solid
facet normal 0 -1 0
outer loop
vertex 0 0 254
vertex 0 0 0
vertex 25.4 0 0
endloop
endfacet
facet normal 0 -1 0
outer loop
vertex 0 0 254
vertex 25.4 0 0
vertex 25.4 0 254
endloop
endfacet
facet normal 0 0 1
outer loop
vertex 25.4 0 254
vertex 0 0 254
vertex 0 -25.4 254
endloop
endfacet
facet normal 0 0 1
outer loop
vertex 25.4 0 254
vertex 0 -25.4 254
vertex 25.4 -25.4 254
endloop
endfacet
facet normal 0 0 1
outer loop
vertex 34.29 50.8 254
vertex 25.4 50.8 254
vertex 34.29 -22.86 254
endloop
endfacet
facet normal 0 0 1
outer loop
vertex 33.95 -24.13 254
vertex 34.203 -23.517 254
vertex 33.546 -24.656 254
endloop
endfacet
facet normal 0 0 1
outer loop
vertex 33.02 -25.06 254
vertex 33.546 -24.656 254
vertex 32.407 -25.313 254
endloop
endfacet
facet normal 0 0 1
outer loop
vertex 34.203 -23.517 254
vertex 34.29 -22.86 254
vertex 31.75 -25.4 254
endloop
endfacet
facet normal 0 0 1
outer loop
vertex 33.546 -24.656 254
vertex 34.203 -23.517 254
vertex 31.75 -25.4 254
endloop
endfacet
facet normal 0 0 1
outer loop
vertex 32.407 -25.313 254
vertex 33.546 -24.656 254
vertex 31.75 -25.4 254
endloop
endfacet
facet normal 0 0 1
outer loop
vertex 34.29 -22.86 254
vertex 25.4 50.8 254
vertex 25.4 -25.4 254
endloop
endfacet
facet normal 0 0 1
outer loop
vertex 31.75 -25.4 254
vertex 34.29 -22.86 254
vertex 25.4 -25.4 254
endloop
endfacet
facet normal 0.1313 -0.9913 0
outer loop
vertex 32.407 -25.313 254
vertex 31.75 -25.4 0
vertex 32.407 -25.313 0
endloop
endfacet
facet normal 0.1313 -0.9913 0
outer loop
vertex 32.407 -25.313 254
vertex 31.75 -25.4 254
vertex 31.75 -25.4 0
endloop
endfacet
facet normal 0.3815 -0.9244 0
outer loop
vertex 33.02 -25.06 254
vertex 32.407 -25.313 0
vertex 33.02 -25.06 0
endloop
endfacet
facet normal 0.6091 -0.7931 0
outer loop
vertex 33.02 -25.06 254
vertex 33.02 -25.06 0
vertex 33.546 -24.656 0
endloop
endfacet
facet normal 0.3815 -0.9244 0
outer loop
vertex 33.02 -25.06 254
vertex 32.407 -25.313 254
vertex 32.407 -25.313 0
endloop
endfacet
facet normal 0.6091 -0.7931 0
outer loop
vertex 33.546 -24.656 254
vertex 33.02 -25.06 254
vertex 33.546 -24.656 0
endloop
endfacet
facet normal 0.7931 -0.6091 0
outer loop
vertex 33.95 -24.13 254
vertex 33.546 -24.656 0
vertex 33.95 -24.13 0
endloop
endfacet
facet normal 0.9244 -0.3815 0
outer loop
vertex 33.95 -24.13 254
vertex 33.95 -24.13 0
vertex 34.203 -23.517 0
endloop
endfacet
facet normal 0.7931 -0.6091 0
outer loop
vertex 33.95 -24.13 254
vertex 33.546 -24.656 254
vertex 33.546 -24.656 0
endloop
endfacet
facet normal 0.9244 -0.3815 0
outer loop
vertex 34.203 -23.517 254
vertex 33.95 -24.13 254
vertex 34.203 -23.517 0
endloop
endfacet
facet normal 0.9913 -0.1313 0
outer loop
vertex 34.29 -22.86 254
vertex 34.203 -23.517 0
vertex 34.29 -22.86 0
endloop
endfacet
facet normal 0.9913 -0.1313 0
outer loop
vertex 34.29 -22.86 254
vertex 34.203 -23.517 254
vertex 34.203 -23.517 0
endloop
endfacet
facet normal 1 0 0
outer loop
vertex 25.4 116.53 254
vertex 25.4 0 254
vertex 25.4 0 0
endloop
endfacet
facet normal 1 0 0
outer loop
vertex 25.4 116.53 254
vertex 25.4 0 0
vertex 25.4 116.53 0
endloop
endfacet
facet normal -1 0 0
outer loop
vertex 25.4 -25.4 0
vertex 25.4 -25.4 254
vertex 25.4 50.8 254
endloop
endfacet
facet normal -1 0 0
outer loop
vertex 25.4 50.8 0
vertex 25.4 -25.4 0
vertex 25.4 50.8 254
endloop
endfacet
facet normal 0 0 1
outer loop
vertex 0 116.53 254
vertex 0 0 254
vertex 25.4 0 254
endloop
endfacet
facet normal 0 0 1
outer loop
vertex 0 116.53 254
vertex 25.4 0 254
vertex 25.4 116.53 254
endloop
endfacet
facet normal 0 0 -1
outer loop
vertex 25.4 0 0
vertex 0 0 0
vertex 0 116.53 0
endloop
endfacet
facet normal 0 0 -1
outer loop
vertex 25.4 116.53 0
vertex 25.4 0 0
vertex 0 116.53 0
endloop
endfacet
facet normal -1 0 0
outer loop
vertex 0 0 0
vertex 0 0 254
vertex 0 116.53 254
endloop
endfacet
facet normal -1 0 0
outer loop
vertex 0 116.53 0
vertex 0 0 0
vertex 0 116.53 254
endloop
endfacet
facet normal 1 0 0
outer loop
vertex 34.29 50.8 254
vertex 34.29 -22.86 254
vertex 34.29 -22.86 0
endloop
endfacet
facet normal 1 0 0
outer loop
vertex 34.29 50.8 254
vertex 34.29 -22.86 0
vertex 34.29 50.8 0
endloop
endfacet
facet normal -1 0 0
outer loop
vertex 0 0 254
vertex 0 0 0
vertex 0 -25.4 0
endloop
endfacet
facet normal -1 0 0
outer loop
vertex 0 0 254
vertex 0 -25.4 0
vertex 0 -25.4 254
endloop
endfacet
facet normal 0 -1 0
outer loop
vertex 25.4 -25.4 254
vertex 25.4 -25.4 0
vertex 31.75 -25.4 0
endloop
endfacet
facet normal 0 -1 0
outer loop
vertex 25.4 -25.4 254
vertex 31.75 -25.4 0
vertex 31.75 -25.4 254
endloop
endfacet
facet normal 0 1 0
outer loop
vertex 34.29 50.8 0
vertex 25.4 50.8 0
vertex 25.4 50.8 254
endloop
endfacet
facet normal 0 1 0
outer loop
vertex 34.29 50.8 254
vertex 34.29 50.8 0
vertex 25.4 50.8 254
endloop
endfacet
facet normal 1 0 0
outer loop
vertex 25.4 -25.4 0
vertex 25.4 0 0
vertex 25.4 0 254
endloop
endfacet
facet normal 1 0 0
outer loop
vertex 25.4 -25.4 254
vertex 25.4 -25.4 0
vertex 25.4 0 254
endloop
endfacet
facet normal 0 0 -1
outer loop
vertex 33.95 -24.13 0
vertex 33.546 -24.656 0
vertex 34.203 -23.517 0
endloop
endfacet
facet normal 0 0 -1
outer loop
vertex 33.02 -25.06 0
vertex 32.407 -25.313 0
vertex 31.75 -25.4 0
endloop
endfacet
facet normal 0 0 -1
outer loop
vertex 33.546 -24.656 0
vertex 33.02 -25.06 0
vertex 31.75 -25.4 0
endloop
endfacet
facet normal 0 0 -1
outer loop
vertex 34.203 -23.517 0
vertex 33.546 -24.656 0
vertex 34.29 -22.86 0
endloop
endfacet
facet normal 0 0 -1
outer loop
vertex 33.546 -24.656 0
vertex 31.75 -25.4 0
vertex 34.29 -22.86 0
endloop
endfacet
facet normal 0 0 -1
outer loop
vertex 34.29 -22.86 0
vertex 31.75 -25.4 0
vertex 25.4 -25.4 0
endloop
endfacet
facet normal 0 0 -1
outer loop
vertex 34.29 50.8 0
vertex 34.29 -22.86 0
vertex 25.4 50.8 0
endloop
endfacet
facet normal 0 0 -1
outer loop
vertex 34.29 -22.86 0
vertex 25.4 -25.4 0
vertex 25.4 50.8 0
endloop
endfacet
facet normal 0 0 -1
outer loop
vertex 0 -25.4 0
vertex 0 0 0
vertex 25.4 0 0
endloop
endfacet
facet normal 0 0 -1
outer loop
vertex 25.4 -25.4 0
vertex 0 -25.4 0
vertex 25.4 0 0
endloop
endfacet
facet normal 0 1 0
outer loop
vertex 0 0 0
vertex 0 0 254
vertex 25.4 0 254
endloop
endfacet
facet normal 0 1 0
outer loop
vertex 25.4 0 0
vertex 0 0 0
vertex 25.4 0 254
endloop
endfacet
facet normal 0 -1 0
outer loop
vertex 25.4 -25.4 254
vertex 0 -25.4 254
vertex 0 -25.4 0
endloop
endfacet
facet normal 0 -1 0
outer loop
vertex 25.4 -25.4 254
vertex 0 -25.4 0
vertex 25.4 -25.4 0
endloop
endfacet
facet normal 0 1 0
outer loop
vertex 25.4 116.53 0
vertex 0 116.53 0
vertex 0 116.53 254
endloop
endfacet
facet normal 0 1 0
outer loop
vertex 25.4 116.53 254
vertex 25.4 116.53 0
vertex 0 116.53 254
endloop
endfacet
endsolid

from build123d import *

# Parameters (mm, degrees)
F0_W      = 116.530262
F0_H      = 254
F1_DEPTH  = 25.4
F1_FACE_W = 25.4
F1_FACE_H = 254
F2_DEPTH  = 25.4
F3_W      = 50.8
F3_H      = 254
F3_W_2    = 25.4
F4_DEPTH  = 8.89
F5_R      = 2.54


with BuildPart() as f1:
    # F0 (on Right) → F1 (new body)
    with BuildSketch(Plane.YZ):
        with Locations((58.265131, 127)):
            Rectangle(F0_W, F0_H)
    extrude(amount=F1_DEPTH)


with BuildPart() as f2:
    # F1_face (on face) → F2 (new body)
    with BuildSketch(Plane(origin=(12.7, 0, 127), x_dir=(1, 0, 0), z_dir=(0, -1, 0))):
        Rectangle(F1_FACE_W, F1_FACE_H)
    extrude(amount=F2_DEPTH)


with BuildPart() as f4:
    # F3 (on face) → F4 (new body)
    with BuildSketch(Plane.YZ.offset(25.4)):
        with Locations((25.4, 127)):
            Rectangle(F3_W, F3_H)
        with Locations((-12.7, 127)):
            Rectangle(F3_W_2, F3_H)
    extrude(amount=F4_DEPTH)

    # F5
    f5_edges = [f4.edges().sort_by_distance(p)[0] for p in [
        (34.29, -25.4, 127),
    ]]
    fillet(f5_edges, radius=F5_R)


solid = Compound([f1.part, f2.part, f4.part])
